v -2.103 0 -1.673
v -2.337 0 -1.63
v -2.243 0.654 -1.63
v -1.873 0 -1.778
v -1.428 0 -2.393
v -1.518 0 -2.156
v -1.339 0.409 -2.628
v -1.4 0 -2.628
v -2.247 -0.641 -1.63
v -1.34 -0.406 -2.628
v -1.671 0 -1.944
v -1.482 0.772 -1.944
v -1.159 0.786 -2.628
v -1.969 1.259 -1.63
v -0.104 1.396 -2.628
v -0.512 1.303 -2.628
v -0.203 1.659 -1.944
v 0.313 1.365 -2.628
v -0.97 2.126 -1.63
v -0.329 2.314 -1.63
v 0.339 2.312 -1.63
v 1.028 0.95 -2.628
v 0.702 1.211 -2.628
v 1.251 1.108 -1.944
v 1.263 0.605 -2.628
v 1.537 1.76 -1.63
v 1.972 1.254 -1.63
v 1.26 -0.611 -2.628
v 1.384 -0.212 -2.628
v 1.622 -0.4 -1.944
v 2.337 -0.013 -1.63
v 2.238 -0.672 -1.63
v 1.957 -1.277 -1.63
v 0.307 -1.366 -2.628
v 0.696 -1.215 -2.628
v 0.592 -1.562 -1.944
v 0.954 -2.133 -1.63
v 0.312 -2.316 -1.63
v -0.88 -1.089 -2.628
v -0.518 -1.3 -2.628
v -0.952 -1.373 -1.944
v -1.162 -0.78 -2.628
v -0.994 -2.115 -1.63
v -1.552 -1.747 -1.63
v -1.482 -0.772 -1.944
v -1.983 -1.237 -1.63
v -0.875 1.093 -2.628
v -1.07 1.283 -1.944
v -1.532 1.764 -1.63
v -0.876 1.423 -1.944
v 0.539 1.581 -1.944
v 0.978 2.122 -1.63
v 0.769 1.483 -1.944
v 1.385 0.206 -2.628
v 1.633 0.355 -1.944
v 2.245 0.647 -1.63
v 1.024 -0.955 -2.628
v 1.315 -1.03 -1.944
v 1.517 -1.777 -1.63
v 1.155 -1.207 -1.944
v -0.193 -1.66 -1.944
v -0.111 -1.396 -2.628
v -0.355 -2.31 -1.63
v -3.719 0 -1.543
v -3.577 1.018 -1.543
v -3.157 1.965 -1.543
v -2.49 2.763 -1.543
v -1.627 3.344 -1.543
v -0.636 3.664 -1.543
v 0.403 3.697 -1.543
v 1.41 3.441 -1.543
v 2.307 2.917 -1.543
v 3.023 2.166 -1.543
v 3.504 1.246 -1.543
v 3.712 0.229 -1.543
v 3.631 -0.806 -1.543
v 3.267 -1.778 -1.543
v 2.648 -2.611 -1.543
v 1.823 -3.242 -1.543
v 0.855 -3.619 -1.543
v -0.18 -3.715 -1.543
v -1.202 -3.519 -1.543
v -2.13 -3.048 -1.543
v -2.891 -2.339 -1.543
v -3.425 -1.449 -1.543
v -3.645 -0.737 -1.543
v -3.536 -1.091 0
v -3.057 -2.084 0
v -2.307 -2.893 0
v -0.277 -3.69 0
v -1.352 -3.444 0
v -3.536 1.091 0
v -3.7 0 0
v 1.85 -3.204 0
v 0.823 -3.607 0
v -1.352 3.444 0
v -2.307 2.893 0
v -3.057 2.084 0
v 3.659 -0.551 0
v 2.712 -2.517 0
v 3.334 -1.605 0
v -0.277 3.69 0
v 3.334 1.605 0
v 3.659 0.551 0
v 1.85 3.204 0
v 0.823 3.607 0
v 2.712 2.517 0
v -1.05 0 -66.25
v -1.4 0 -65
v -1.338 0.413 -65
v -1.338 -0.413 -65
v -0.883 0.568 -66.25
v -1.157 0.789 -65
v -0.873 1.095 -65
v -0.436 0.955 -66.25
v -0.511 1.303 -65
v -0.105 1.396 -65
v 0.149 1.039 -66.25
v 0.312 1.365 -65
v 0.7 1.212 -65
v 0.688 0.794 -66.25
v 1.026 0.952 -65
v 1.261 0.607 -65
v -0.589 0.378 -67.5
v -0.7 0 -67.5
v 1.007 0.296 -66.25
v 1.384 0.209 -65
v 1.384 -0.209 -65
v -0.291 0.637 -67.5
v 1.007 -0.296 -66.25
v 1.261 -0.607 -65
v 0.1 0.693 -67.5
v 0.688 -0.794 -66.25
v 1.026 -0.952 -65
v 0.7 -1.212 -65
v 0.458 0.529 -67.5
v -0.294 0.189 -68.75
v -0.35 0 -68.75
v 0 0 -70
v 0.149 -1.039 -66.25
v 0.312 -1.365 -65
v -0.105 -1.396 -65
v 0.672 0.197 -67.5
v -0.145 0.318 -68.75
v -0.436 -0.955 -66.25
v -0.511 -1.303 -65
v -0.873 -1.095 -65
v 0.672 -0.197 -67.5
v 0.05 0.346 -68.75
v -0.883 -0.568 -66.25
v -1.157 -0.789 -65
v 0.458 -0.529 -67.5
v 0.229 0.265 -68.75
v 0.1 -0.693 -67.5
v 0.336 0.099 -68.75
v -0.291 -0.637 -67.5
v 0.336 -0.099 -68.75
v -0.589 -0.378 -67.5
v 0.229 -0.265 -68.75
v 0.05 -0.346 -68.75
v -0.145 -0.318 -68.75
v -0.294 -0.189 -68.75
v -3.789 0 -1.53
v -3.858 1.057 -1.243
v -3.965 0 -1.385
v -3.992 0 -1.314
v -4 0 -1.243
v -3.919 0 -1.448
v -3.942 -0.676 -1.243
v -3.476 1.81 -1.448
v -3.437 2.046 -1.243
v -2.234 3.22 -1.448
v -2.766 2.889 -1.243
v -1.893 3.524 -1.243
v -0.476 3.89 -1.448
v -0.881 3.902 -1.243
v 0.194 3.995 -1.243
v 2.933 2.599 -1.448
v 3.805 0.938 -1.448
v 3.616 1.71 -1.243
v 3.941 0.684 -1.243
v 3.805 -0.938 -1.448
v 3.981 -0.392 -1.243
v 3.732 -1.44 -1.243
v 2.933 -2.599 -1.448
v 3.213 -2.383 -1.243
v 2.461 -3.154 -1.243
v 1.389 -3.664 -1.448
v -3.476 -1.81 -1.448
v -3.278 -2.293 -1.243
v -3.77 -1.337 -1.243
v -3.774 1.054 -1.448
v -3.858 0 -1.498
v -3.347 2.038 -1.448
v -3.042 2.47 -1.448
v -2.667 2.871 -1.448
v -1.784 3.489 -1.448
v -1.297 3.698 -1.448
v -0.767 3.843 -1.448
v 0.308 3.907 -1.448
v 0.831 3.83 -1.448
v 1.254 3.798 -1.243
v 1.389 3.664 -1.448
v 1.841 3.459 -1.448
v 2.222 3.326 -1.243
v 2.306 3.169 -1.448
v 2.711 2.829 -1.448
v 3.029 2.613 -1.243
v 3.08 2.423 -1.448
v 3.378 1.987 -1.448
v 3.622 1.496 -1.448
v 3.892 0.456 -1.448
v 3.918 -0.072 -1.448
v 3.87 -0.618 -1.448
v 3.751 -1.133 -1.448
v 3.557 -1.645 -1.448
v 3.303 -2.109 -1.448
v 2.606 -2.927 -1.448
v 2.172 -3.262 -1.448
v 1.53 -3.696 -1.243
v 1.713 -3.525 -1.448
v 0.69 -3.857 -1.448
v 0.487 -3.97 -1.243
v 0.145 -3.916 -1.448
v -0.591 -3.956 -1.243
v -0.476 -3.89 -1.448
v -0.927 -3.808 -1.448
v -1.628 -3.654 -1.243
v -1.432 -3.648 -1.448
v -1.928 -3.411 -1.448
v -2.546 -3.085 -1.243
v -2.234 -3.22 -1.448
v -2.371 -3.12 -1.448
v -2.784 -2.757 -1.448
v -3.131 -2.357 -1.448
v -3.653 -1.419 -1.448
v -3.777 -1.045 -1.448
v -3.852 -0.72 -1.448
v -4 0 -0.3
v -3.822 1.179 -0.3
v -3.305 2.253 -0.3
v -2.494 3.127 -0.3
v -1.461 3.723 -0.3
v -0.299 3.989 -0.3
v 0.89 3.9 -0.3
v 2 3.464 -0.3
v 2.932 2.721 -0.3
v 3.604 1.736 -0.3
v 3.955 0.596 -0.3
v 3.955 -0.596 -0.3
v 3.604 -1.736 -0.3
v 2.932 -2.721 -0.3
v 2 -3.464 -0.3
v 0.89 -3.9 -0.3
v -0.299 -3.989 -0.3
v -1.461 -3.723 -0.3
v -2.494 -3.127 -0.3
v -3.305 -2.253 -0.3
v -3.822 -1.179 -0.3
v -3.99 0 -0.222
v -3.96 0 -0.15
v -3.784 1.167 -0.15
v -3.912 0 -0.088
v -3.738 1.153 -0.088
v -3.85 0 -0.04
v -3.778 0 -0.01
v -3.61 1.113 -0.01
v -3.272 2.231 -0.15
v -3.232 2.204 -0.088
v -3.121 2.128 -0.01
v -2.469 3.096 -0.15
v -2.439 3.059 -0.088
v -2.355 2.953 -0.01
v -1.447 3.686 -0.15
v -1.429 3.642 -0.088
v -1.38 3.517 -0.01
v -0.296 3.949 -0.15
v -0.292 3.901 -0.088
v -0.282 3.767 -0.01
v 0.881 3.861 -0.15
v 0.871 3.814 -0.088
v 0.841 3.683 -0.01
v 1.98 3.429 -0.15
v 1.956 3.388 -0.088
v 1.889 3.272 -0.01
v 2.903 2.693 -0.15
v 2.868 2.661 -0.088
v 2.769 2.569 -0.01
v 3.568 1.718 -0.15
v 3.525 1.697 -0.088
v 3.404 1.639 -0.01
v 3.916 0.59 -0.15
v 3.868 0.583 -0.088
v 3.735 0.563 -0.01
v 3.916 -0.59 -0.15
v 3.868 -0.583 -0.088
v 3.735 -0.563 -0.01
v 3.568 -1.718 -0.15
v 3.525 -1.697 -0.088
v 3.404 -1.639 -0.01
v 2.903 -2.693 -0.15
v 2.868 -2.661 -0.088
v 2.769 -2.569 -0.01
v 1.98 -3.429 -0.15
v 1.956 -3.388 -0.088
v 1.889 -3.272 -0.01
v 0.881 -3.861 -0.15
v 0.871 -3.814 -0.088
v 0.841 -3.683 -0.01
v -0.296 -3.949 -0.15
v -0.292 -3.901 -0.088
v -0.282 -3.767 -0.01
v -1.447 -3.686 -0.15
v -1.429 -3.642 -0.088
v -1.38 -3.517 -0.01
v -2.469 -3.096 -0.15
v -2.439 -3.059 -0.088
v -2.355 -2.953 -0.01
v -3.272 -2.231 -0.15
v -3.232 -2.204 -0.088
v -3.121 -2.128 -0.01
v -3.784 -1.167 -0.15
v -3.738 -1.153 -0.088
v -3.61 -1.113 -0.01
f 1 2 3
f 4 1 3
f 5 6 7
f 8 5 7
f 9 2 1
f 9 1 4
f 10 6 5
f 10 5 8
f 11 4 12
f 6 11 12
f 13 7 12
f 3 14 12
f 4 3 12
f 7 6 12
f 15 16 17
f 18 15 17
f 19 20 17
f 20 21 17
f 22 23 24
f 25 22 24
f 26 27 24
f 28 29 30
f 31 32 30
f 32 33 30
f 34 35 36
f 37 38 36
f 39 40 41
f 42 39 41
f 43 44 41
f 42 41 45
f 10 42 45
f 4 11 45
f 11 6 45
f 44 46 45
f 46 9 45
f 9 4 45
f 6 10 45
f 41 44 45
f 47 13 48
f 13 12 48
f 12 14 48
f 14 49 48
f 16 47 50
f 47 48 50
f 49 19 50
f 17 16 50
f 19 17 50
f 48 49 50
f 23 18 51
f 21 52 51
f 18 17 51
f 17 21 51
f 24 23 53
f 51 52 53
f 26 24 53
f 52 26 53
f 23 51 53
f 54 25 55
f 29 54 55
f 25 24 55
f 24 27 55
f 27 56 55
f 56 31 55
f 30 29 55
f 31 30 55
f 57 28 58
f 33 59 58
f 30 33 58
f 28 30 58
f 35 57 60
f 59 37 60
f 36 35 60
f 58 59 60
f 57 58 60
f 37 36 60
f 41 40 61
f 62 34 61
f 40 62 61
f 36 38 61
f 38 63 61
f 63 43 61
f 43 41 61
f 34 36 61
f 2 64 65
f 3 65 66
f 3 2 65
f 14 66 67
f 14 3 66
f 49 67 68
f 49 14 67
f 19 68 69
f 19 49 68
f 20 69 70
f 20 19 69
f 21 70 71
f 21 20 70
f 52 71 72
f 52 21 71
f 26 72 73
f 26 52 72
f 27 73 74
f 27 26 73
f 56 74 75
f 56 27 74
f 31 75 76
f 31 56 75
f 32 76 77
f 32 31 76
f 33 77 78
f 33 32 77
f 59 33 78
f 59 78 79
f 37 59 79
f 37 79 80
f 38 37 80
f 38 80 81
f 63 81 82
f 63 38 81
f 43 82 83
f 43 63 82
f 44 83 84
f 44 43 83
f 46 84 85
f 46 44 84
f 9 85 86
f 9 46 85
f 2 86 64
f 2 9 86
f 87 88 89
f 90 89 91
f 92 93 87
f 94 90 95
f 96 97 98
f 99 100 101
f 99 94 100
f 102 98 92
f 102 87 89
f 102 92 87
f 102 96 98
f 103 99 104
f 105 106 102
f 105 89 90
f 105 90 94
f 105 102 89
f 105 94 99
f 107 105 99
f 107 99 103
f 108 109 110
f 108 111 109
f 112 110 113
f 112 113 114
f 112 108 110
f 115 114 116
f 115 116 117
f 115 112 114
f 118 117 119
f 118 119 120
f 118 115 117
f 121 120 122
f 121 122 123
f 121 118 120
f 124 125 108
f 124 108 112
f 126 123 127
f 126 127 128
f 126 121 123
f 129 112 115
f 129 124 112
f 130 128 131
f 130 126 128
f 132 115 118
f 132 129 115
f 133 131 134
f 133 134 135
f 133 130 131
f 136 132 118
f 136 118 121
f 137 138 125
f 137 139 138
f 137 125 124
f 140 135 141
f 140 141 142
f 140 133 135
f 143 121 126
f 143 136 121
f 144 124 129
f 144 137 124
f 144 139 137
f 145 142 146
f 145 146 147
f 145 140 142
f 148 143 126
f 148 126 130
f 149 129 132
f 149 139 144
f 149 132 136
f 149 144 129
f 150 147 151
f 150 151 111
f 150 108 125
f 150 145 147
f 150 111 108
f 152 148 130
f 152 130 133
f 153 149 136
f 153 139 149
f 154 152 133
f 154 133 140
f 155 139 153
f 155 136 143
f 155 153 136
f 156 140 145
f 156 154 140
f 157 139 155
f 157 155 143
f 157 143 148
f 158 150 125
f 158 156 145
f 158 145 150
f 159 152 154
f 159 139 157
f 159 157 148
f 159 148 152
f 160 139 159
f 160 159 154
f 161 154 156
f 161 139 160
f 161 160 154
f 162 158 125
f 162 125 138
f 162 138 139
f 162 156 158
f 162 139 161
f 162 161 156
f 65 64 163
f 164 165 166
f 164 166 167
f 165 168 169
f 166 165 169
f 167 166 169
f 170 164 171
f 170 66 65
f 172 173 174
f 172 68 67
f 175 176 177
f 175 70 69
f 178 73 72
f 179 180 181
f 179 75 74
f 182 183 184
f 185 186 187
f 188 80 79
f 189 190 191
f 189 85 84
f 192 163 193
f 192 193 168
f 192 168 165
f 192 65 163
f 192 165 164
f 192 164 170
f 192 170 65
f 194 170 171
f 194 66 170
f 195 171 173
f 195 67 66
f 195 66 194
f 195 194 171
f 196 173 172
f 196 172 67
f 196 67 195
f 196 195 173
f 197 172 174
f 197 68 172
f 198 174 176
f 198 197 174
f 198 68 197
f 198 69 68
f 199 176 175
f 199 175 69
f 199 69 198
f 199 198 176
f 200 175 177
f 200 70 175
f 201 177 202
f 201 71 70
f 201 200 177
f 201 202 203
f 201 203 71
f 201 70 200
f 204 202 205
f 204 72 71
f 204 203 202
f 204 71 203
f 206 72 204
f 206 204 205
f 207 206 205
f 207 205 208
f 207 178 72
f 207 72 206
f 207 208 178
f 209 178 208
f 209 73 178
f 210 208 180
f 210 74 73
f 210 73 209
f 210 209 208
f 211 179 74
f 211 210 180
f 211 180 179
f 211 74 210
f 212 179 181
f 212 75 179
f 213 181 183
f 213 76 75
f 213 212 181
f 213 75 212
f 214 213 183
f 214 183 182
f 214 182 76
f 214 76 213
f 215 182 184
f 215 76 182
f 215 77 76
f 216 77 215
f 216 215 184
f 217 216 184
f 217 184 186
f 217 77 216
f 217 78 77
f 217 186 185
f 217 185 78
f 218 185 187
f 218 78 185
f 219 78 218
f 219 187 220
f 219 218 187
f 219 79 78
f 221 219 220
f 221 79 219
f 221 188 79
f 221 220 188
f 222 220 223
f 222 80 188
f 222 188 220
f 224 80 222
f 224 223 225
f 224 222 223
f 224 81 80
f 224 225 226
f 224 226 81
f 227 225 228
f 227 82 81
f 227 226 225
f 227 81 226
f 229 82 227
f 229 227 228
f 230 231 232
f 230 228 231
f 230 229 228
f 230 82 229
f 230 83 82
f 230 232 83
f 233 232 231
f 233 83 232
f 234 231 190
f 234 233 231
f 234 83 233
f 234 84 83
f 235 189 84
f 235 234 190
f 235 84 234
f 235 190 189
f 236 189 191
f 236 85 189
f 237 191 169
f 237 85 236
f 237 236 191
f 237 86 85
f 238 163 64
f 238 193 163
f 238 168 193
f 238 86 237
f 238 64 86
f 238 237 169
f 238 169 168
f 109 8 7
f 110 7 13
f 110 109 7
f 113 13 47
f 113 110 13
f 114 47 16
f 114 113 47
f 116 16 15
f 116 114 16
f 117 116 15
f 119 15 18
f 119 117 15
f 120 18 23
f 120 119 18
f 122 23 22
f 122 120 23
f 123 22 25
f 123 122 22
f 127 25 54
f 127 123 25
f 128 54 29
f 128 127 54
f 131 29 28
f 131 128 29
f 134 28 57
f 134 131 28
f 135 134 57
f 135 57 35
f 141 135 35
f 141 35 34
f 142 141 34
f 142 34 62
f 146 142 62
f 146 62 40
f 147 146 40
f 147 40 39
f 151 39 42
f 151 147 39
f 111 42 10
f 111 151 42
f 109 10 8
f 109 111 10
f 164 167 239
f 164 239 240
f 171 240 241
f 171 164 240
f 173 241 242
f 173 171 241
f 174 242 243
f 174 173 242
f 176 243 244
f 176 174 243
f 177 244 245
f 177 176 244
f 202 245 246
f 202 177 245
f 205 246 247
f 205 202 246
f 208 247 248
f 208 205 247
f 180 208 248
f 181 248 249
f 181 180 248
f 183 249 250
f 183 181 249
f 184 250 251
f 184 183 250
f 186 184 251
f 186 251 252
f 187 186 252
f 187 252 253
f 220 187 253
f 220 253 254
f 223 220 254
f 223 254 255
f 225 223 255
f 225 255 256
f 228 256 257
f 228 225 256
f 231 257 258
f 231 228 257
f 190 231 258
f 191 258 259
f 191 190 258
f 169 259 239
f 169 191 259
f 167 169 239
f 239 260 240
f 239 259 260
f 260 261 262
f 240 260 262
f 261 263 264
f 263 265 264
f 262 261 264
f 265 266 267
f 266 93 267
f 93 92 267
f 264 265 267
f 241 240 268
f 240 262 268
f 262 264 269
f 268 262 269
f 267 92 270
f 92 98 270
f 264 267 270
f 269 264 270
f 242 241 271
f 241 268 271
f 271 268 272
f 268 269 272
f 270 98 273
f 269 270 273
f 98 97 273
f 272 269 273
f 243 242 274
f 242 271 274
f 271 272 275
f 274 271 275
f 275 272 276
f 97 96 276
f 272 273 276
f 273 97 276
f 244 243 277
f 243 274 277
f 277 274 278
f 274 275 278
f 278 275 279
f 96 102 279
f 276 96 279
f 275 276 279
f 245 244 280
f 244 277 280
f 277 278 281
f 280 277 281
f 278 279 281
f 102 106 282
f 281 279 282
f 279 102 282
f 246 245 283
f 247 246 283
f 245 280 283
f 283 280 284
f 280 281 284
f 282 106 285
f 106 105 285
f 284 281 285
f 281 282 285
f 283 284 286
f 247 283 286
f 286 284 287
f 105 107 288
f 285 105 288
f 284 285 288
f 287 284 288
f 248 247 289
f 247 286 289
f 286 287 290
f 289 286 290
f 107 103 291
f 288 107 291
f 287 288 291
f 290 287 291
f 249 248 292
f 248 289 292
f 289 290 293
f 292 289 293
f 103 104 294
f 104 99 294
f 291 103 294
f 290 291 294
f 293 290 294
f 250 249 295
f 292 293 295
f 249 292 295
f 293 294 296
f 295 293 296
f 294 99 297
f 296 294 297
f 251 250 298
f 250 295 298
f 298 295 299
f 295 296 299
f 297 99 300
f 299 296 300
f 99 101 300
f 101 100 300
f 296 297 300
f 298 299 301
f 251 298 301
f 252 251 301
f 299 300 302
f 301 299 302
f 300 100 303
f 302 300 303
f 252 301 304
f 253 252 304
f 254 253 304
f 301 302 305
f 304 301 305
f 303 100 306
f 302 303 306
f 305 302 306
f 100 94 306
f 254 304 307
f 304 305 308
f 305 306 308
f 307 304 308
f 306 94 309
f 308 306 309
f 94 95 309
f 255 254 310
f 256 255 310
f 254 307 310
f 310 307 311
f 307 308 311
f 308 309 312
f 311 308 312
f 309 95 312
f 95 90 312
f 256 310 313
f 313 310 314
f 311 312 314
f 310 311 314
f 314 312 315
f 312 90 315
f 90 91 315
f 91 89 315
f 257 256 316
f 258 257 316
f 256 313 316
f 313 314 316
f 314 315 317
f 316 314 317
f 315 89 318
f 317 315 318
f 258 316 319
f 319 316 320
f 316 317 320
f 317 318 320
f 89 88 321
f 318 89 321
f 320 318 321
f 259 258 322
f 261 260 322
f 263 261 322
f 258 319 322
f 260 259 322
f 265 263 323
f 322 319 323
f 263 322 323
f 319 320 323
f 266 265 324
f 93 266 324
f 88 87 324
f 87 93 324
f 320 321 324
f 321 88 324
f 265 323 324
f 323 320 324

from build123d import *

# Parameters (mm, degrees)
F2_R = 1
F3_R = 0.3


# Not quite as in the source:
# - a feature names something its author has since deleted; it is built from what else it names


with BuildPart() as f1:
    # F0 (on Front) → F1 (revolve)
    with BuildSketch(Plane.XZ):
        Polygon((0, -70), (0, 0), (-1.4, 0), (-1.4, -1.6894261353), (-1.4, -65), align=None)
        Polygon((-1.4, -1.6894261353), (-1.4, 0), (-4, 0), (-4, -1.5247049741), align=None)
    revolve(axis=Axis((0, 0, -35), (0, 0, -1)))

    # F2
    f2_edges = [f1.edges().sort_by_distance(p)[0] for p in [
        (1.4, 0, -1.689426),
    ]]
    fillet(f2_edges, radius=F2_R)

    # F3
    f3_edges = [f1.edges().sort_by_distance(p)[0] for p in [
        (4, 0, 0),
        (4, 0, -1.524705),
    ]]
    fillet(f3_edges, radius=F3_R)


solid = f1.part
